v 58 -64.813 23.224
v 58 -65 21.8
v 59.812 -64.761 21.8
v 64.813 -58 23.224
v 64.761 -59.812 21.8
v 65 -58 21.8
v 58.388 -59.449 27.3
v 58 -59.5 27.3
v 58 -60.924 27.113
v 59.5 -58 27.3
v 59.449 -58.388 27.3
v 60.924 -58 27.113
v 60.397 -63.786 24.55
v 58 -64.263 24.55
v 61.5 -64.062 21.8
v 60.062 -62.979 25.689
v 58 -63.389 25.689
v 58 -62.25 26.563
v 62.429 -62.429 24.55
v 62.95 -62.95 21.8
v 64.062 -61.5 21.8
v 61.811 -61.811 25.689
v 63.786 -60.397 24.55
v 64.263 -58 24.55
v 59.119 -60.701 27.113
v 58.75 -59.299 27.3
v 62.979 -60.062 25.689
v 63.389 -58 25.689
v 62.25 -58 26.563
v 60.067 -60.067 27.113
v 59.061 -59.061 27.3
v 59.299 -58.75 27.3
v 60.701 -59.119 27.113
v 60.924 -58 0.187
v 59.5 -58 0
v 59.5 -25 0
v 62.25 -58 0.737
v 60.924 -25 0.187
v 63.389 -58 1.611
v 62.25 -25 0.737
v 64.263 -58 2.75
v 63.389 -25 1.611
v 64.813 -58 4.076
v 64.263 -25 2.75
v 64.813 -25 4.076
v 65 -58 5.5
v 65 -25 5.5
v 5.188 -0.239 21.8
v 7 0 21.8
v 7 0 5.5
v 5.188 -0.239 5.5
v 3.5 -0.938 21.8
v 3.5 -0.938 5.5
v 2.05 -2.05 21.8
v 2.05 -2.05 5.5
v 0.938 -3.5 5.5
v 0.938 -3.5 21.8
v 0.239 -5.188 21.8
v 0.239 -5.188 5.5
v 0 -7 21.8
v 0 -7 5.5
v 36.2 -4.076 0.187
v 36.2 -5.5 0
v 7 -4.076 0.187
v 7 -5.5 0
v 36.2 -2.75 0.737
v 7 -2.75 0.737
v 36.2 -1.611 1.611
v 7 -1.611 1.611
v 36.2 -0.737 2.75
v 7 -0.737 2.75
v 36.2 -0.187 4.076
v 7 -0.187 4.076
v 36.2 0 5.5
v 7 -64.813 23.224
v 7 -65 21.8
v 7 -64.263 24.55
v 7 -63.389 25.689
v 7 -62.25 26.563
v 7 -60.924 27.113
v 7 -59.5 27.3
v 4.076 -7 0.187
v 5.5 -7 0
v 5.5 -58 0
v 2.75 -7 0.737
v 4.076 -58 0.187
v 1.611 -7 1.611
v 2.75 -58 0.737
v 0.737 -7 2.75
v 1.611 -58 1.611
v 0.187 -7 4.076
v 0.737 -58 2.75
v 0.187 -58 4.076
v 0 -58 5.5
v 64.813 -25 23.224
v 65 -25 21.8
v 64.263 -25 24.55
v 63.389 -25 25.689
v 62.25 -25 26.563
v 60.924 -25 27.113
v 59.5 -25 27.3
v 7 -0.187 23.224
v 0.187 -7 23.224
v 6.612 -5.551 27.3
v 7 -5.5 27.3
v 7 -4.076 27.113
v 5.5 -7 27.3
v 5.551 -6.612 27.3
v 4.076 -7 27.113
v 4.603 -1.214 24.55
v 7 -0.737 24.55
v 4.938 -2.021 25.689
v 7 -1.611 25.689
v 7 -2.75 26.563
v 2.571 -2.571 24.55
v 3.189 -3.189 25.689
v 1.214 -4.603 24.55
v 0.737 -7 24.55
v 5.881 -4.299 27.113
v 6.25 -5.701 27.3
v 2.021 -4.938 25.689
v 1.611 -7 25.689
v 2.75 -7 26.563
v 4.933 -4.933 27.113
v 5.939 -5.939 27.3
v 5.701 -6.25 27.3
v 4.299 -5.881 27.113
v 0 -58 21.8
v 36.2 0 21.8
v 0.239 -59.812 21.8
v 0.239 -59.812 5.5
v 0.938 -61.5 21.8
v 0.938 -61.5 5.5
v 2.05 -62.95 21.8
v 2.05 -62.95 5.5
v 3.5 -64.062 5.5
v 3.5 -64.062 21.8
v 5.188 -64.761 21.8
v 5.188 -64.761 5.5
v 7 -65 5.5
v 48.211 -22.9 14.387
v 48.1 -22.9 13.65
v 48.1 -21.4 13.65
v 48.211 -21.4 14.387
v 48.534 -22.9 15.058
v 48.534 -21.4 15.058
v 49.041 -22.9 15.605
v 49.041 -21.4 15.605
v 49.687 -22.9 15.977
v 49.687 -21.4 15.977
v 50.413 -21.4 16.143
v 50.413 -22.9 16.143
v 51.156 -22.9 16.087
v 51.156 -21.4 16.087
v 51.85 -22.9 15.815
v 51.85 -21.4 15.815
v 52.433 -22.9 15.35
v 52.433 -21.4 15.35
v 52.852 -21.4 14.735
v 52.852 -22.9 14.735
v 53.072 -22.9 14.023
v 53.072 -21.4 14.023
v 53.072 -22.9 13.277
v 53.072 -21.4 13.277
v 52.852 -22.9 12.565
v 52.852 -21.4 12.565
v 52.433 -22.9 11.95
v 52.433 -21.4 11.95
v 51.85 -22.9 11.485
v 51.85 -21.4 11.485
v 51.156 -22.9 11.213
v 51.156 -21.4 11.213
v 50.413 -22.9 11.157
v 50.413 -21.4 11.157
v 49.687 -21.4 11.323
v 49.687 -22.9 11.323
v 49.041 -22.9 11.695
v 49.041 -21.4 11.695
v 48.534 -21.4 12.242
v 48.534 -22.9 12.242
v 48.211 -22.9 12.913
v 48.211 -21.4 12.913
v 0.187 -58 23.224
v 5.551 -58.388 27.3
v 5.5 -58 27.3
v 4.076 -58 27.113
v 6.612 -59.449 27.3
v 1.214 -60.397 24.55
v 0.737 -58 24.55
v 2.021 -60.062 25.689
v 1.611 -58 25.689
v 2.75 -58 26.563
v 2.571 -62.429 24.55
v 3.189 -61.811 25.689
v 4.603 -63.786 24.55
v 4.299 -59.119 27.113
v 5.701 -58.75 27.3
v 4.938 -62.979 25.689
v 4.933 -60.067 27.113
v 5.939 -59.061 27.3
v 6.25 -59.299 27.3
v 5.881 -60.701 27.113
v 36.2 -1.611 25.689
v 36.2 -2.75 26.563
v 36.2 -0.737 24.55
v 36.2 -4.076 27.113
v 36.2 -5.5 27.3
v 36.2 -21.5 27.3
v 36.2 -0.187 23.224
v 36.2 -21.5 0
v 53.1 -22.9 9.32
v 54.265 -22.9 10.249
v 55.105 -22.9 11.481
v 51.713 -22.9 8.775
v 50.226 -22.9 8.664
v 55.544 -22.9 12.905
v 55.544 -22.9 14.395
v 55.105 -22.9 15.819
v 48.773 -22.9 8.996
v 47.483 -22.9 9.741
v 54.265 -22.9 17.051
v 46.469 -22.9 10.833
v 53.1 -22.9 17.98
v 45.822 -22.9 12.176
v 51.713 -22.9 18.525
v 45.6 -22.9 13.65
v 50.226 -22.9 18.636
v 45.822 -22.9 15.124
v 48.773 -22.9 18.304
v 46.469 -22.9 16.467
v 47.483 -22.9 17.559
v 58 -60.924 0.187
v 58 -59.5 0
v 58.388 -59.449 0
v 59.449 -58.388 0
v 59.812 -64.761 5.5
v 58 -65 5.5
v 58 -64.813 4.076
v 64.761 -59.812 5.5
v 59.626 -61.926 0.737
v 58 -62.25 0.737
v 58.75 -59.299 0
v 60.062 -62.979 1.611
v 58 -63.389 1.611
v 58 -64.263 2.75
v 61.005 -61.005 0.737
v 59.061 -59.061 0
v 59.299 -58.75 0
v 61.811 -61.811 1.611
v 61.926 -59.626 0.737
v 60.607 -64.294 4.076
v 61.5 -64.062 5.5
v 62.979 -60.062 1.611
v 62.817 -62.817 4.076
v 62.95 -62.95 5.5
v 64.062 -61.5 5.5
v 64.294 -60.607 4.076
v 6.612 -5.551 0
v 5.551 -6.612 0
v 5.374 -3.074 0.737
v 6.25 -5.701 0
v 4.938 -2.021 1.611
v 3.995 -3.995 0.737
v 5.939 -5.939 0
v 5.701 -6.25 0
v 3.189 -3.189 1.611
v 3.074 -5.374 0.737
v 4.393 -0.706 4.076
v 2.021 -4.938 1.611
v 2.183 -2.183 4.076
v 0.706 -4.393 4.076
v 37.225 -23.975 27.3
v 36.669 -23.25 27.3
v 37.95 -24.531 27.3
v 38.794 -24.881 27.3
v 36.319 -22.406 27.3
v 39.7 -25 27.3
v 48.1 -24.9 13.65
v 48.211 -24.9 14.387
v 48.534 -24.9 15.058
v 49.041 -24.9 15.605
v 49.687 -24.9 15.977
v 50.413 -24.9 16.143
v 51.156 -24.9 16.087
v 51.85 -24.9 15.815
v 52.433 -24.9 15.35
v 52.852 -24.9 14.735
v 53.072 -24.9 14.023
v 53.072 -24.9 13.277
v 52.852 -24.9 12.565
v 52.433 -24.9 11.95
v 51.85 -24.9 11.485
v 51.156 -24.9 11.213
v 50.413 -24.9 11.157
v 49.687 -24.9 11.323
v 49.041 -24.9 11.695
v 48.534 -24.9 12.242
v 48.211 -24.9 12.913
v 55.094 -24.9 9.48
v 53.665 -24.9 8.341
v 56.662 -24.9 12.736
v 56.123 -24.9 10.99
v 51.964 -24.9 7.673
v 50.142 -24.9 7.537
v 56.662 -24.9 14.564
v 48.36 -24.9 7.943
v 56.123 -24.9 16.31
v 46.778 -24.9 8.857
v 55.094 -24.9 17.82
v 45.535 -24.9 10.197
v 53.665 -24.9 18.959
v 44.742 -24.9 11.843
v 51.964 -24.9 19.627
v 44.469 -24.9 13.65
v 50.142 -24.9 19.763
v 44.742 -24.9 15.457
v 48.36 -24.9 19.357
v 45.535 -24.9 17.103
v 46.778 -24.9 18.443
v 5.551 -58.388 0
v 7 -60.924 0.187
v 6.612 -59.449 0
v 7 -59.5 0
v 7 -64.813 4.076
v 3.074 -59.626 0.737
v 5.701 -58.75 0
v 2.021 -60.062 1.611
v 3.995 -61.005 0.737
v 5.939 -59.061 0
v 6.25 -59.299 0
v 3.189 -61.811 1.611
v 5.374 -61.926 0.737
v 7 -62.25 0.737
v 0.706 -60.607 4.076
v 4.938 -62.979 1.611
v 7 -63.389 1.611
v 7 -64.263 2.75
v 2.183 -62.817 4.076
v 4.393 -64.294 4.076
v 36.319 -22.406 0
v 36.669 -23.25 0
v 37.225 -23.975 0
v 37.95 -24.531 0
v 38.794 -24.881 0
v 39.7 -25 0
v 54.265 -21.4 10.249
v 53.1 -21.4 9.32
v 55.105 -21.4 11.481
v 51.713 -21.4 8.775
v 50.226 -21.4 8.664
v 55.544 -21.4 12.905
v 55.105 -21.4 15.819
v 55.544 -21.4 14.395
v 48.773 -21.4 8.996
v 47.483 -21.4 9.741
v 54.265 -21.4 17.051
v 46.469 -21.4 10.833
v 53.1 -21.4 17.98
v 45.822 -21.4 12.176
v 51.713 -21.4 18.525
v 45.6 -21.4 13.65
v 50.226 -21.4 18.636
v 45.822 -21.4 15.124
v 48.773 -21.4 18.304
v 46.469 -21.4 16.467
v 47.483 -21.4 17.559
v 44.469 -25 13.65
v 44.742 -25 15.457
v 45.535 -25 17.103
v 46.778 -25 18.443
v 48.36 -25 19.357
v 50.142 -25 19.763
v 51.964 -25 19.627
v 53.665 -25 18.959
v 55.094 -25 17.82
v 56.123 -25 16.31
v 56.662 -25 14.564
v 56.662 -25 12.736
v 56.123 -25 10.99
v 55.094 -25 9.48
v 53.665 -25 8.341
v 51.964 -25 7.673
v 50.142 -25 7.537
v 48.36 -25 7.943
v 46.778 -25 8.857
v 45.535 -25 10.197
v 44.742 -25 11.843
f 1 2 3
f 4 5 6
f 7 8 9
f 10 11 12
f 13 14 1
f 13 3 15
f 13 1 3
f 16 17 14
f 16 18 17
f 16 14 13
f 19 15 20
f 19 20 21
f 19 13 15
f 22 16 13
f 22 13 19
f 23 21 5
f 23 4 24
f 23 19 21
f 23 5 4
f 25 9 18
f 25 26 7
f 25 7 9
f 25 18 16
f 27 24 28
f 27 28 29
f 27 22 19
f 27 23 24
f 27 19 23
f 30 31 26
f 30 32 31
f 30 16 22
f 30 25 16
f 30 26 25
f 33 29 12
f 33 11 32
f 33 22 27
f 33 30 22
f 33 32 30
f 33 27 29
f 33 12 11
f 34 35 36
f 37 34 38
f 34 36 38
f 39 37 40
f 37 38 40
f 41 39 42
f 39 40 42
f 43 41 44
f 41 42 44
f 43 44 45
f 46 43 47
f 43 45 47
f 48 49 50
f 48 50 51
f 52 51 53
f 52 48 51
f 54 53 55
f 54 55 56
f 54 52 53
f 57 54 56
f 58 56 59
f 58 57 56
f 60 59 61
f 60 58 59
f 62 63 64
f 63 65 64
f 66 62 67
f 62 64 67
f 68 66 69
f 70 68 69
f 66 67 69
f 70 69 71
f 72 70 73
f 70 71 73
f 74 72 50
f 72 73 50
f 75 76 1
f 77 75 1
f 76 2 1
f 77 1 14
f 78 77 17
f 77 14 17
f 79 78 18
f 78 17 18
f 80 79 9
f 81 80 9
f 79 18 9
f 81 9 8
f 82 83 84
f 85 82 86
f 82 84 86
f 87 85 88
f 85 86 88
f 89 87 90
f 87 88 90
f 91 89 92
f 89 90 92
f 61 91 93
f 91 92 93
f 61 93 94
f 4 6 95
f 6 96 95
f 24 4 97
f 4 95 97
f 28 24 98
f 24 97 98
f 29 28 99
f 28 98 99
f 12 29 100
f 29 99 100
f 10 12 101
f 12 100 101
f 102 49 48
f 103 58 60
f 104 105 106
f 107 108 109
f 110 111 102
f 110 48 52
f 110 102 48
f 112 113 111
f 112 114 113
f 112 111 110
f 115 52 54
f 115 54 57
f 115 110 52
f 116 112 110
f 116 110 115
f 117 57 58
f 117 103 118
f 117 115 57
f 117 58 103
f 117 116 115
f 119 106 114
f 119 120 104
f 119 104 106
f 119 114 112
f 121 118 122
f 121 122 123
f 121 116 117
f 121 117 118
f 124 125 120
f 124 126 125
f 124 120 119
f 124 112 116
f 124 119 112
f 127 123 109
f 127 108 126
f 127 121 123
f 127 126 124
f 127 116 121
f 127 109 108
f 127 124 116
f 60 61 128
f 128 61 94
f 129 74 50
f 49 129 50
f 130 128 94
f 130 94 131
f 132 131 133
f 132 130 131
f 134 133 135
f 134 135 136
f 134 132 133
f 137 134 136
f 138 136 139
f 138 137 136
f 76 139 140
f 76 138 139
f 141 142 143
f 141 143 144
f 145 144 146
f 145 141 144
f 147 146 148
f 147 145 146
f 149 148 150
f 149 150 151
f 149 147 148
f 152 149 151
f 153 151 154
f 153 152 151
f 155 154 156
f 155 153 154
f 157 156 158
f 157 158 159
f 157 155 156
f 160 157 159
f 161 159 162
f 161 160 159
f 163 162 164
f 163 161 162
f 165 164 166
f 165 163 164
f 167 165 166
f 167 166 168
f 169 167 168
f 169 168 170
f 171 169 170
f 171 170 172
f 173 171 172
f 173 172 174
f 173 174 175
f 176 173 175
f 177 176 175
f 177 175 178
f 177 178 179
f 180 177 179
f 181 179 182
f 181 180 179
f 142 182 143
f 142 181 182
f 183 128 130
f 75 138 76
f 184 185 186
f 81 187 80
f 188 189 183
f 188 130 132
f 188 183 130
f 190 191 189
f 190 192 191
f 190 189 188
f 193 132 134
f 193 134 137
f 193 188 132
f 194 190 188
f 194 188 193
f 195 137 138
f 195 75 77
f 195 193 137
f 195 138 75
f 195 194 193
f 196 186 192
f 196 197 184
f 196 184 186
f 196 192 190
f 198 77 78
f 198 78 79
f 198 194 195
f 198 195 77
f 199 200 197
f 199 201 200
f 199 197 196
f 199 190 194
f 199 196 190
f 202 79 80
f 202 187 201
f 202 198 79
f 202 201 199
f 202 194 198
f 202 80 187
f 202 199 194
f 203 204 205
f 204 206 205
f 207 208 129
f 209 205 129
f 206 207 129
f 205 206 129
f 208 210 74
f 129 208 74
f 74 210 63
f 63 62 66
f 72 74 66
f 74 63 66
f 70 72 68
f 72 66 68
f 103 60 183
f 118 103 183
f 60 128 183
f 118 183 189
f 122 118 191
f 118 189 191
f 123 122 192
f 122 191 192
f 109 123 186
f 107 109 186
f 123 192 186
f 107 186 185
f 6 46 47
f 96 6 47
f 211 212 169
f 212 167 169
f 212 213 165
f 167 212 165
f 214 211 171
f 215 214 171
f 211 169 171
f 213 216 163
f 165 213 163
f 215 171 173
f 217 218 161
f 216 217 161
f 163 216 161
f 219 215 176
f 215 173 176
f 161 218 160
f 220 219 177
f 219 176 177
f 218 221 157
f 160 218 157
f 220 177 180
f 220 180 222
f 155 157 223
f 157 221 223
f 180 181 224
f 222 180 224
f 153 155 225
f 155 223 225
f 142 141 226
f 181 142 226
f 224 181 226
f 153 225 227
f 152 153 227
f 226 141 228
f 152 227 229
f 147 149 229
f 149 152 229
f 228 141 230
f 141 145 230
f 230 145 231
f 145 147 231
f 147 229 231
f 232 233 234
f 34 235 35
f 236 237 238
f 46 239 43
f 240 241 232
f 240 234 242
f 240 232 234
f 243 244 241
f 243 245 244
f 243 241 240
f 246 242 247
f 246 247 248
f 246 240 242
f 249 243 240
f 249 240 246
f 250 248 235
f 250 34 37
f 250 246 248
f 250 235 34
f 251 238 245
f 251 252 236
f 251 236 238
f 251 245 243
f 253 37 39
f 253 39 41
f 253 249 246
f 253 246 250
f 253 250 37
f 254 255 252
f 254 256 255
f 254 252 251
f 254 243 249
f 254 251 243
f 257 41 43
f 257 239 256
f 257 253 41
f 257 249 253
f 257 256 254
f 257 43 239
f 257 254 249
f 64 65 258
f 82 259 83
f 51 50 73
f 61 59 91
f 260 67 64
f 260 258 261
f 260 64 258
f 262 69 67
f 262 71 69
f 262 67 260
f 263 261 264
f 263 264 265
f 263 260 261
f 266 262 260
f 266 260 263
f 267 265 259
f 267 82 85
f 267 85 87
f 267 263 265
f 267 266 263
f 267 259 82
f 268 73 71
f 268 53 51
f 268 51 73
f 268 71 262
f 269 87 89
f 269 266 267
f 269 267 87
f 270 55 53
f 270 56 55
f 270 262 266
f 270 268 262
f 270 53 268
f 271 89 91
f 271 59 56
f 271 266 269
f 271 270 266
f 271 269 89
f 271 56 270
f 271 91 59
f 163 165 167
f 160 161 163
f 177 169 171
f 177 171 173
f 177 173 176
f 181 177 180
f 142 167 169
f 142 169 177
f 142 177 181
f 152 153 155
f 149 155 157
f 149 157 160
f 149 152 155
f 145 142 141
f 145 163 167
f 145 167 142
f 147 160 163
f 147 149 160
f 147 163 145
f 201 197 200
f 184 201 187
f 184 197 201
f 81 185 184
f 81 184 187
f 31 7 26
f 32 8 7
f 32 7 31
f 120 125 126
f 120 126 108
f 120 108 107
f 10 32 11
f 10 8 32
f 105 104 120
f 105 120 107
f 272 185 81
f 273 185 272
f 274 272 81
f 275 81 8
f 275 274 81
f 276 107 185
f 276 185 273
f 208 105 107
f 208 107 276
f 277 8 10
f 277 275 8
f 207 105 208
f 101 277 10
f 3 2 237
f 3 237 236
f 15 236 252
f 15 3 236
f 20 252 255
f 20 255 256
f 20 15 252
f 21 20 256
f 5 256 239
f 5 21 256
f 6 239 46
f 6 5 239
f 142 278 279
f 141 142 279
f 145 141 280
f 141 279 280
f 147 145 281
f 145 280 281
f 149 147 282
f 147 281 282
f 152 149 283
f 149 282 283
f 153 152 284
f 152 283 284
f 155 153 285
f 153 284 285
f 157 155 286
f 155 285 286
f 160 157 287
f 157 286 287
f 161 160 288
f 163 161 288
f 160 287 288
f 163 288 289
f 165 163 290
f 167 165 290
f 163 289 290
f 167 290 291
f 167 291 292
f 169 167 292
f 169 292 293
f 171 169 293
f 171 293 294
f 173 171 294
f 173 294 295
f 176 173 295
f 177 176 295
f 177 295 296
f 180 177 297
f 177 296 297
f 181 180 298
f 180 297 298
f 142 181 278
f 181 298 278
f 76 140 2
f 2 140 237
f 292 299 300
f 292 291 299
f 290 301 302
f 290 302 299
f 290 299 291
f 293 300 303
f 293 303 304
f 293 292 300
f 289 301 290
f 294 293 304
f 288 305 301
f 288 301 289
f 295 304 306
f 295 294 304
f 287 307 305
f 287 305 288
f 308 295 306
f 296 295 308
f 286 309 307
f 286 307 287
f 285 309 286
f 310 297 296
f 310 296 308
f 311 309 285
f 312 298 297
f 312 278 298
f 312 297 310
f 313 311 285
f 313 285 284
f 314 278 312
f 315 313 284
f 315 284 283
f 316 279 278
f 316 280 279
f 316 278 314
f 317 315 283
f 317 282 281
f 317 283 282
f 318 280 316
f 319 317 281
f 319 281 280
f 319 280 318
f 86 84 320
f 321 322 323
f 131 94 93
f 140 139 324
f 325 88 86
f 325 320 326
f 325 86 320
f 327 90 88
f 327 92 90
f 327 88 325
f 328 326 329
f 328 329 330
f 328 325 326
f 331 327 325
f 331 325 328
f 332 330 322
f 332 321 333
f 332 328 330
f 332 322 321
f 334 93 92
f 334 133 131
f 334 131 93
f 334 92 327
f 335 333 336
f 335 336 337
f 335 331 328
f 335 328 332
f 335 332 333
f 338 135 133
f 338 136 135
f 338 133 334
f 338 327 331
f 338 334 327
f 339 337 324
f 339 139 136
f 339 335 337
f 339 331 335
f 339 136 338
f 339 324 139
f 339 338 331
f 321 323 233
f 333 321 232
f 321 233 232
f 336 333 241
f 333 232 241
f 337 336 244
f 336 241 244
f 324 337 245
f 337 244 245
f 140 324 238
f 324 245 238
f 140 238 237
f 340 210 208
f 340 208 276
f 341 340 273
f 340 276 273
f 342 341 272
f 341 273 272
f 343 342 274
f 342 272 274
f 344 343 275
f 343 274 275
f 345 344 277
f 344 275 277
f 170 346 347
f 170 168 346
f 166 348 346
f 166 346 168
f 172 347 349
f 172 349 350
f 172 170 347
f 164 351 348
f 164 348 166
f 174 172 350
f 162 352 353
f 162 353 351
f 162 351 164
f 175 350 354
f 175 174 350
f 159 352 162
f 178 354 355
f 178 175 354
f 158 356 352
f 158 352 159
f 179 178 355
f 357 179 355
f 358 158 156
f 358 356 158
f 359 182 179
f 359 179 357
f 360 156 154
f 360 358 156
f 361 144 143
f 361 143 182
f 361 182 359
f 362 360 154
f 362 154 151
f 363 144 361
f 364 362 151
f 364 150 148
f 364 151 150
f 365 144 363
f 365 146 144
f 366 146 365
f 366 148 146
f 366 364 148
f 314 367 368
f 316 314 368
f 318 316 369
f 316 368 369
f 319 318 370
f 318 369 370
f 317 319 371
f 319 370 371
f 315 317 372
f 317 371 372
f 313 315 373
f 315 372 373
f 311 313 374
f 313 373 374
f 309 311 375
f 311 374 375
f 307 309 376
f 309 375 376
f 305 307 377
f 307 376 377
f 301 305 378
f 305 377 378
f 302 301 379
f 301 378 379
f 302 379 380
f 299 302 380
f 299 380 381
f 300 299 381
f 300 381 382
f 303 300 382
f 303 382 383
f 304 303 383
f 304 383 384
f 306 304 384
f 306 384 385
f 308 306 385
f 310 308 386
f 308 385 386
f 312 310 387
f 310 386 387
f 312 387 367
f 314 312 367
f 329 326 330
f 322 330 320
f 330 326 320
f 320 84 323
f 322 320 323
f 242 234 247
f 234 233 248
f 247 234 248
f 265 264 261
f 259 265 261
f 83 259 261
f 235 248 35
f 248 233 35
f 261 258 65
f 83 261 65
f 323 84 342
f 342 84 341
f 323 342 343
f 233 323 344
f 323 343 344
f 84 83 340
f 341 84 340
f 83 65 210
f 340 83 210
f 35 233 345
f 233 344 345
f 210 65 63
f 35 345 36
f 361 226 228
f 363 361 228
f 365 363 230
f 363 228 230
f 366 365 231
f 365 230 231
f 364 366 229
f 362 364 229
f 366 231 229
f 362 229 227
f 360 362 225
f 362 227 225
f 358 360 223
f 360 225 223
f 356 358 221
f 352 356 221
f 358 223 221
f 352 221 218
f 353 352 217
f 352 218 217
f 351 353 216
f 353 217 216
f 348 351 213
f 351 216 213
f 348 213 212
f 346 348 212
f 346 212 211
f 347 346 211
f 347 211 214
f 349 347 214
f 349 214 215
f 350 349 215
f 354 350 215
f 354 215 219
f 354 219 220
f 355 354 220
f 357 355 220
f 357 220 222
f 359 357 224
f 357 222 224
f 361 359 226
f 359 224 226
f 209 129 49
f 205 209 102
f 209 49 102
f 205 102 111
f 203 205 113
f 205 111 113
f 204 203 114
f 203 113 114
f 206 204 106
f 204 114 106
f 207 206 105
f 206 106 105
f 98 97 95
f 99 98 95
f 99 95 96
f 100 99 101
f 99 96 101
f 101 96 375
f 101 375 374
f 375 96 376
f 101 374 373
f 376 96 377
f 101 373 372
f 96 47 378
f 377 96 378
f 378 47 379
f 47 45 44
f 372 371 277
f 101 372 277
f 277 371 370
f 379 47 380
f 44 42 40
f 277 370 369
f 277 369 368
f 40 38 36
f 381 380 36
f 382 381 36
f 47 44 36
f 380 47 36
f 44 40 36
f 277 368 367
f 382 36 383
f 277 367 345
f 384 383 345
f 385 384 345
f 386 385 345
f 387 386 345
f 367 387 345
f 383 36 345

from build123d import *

# Parameters (mm, degrees)
F1_DEPTH  = 27.3
F3_R      = 7
F4_R      = 3.5
F5_R      = 5.5
F2_R      = 6.1305723334
F6_DEPTH  = 0.1
F7_R      = 2.5
F8_DEPTH  = 2
F9_R      = 5
F9_R_2    = 2.5
F10_DEPTH = 1.5


with BuildPart() as f1:
    # F0 (on Top) → F1 (new body)
    with BuildSketch(Plane.XY):
        Polygon((36.2, 0), (0, 0), (0, -65), (65, -65), (65, -25), (36.2, -25), align=None)
    extrude(amount=F1_DEPTH)

    # F3
    f3_edges = [f1.edges().sort_by_distance(p)[0] for p in [
        (0, 0, 13.65),
        (0, -65, 13.65),
        (65, -65, 13.65),
    ]]
    fillet(f3_edges, radius=F3_R)

    # F4
    f4_edges = [f1.edges().sort_by_distance(p)[0] for p in [
        (36.2, -25, 13.65),
    ]]
    fillet(f4_edges, radius=F4_R)

    # F5
    f5_edges = [f1.edges().sort_by_distance(p)[0] for p in [
        (65, -41.5, 0),
        (62.949747, -62.949747, 0),
        (32.5, -65, 0),
        (2.050253, -62.949747, 0),
        (0, -32.5, 0),
        (2.050253, -2.050253, 0),
        (21.6, 0, 0),
        (21.6, 0, 27.3),
        (2.050253, -2.050253, 27.3),
        (0, -32.5, 27.3),
        (2.050253, -62.949747, 27.3),
        (32.5, -65, 27.3),
        (62.949747, -62.949747, 27.3),
        (65, -41.5, 27.3),
    ]]
    fillet(f5_edges, radius=F5_R)

    # F2 (on face) → F6 (join)
    with BuildSketch(Plane(origin=(0, -25, 0), x_dir=(-1, 0, 0), z_dir=(0, 1, 0))):
        with Locations((-50.6, 13.65)):
            Circle(F2_R)
    extrude(amount=F6_DEPTH)

    # F7 (on face) → F8 (join)
    with BuildSketch(Plane(origin=(0, -24.9, 0), x_dir=(-1, 0, 0), z_dir=(0, 1, 0))):
        with Locations((-50.6, 13.65)):
            Circle(F7_R)
    extrude(amount=F8_DEPTH)


with BuildPart() as f10:
    # F9 (on face) → F10 (new body)
    with BuildSketch(Plane(origin=(0, -22.9, 0), x_dir=(-1, 0, 0), z_dir=(0, 1, 0))):
        with Locations((-50.6, 13.65)):
            Circle(F9_R)
        with Locations((-50.6, 13.65)):
            Circle(F9_R_2, mode=Mode.SUBTRACT)
    extrude(amount=F10_DEPTH)


solid = Compound([f1.part, f10.part])
